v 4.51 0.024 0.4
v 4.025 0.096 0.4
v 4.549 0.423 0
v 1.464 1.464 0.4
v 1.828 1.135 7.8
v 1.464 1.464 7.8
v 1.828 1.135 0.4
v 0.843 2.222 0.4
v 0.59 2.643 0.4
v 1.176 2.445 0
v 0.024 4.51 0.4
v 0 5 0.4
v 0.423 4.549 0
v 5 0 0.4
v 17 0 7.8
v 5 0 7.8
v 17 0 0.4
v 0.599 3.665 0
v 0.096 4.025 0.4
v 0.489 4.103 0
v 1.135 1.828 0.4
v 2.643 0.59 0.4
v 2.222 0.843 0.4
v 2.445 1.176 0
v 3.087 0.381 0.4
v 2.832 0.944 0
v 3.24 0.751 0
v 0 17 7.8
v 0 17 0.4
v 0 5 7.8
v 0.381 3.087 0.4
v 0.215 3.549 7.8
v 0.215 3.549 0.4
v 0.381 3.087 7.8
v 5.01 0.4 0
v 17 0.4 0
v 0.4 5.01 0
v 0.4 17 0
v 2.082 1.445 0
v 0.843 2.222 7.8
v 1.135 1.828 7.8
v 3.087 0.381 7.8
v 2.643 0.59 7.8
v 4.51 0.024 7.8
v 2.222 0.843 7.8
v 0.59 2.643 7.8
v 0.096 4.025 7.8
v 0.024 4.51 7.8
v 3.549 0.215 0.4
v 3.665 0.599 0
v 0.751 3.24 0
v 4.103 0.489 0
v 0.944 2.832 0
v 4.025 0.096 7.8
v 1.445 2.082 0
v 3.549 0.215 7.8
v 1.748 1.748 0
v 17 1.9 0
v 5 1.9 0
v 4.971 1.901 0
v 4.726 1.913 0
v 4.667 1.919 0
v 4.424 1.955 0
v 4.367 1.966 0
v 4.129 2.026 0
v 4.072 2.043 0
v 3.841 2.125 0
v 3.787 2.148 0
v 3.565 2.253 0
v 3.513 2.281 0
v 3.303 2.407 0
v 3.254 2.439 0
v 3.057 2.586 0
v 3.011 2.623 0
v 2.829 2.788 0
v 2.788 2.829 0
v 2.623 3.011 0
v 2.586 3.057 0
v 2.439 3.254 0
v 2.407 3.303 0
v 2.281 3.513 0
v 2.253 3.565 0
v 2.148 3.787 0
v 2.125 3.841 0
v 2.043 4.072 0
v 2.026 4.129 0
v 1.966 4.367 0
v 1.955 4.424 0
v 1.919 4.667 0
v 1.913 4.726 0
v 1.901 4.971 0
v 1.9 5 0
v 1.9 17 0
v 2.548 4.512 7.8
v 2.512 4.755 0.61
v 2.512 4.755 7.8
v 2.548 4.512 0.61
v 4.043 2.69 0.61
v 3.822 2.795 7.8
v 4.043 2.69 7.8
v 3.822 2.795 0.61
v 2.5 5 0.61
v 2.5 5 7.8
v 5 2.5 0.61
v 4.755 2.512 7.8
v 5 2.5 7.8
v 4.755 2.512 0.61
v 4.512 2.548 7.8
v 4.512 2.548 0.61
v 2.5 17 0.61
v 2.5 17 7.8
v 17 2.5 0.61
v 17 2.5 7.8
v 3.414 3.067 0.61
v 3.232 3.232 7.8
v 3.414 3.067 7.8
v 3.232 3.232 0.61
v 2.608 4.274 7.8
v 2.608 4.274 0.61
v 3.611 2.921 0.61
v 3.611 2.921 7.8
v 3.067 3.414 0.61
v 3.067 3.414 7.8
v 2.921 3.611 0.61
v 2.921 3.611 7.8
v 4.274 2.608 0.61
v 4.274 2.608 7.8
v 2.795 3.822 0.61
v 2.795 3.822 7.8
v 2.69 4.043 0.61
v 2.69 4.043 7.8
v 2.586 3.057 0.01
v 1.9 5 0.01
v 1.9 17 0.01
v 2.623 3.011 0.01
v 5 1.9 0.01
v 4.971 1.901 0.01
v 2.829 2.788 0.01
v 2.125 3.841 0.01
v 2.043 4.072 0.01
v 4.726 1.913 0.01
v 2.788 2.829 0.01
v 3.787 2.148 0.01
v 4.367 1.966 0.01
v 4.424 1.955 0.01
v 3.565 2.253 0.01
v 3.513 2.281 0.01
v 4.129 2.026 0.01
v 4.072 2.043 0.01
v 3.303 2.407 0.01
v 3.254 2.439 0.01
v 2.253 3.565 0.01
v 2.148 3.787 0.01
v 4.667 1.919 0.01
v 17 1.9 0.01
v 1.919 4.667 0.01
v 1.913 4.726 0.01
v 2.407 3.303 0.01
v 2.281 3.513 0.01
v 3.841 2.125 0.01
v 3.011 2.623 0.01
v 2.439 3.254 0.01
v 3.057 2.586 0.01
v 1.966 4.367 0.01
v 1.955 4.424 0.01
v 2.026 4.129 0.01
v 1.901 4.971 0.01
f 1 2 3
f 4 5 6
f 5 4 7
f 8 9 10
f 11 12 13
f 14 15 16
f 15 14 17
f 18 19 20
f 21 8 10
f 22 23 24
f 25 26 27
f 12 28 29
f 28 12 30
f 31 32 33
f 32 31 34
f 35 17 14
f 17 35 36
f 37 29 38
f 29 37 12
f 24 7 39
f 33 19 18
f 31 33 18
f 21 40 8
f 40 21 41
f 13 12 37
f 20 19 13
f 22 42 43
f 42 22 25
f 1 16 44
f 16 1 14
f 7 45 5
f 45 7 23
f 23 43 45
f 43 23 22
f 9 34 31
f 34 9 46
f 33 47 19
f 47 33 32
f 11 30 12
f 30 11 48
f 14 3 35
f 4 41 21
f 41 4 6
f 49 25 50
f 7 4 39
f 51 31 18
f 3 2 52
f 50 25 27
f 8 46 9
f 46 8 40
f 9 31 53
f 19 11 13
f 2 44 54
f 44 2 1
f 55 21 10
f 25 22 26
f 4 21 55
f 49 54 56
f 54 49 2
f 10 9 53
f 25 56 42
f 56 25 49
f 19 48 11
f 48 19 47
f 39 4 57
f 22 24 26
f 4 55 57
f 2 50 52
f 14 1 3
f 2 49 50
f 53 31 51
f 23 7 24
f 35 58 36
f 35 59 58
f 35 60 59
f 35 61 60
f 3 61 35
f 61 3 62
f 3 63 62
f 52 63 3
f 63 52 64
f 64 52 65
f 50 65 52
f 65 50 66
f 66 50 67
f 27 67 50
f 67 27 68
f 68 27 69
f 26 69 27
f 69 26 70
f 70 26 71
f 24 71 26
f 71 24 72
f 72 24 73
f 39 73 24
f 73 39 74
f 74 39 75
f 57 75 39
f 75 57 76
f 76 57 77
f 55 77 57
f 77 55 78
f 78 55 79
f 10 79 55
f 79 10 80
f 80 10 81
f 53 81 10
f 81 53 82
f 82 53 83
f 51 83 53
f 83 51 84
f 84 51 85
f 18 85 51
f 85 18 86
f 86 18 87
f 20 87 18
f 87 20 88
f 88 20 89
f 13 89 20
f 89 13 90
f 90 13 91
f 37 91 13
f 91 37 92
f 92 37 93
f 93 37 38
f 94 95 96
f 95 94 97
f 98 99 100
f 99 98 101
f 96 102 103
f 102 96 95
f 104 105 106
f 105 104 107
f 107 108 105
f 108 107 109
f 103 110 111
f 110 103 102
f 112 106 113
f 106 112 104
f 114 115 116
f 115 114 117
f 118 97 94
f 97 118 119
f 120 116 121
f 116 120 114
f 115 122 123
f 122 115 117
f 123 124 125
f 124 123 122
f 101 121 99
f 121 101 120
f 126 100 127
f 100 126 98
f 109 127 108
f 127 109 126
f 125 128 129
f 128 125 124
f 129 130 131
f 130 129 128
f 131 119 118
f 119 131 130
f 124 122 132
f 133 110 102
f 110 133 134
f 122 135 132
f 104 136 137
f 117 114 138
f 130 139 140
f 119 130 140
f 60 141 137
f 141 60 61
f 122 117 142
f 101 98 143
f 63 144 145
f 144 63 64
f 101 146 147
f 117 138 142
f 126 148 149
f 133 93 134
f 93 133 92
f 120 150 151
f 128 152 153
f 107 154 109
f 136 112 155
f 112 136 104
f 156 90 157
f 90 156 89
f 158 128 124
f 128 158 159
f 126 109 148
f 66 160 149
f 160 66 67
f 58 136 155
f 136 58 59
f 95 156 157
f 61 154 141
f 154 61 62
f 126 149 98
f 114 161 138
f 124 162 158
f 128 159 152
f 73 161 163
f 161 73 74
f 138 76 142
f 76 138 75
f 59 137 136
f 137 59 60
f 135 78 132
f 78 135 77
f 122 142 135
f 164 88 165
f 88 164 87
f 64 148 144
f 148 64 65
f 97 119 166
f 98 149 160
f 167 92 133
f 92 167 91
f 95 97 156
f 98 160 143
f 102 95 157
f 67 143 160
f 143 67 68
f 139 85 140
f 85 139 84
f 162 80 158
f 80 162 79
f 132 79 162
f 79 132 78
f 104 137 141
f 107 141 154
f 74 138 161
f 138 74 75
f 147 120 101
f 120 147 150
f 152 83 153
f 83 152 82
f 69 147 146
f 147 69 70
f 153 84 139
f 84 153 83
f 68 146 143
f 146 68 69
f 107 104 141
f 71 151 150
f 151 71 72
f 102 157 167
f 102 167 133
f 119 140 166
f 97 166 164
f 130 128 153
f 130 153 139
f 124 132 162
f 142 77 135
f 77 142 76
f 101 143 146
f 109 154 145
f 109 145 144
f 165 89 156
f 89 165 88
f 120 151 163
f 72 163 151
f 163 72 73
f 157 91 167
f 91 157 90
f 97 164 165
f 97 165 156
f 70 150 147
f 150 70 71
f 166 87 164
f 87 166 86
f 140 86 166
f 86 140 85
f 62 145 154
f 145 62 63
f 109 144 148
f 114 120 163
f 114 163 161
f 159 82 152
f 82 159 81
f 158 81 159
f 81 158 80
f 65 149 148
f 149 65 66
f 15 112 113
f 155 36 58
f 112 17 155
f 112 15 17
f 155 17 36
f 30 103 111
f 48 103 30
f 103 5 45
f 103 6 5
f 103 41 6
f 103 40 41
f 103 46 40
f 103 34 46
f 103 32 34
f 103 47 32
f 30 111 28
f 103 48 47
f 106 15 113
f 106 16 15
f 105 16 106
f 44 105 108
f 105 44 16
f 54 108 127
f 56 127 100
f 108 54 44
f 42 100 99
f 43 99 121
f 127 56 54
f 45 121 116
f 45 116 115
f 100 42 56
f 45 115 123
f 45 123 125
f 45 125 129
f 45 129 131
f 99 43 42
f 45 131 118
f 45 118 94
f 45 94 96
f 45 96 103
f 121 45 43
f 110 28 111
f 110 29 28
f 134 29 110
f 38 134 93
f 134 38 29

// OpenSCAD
// Rounded L bracket — construction walkthrough.
//
// Standalone teaching file for the rounded L bracket example.
// It exposes the deliberately extended convex profiles, both chamfer
// constructions, and the final trimming operation.

$fn = 64;

design_step = "10_chamfer_closeup"; // [01_outer_profile,02_inner_profile,03_shell_profile,04_outer_chamfer_inputs,05_outer_body,06_inner_chamfer_inputs,07_inner_chamfer_cut,08_before_trim,09_final_trim,10_chamfer_closeup]

leg_x          = 40;
leg_y          = 30;
height         = 20;
wall_thickness = 2.5;
outer_radius   = 5;
inner_chamfer  = 0.6;
outer_chamfer  = 0.4;

epsilon      = 0.01;
inner_radius = max(outer_radius - wall_thickness, 0.01);

profile_x = leg_x + 2;
profile_y = leg_y + 2;

// ---------- Shared geometry ----------

module outer_2d() {
    hull() {
        translate([outer_radius, outer_radius])
            circle(outer_radius);

        translate([profile_x - epsilon, 0])
            square([epsilon, profile_y]);

        translate([0, profile_y - epsilon])
            square([profile_x, epsilon]);
    }
}

module inner_2d() {
    translate([wall_thickness, wall_thickness])
        hull() {
            translate([inner_radius, inner_radius])
                circle(inner_radius);

            translate([profile_x - epsilon, 0])
                square([epsilon, profile_y]);

            translate([0, profile_y - epsilon])
                square([profile_x, epsilon]);
        }
}

module shell_2d() {
    difference() {
        outer_2d();
        inner_2d();
    }
}

module outer_end_layer(z, inset = 0, thickness = 0.08) {
    translate([0, 0, z])
        linear_extrude(thickness)
            offset(r = inset)
                outer_2d();
}

module inner_end_layer(z, expansion = 0, thickness = 0.08) {
    translate([0, 0, z])
        linear_extrude(thickness)
            offset(r = expansion)
                inner_2d();
}

module outer_body() {
    hull() {
        linear_extrude(epsilon)
            offset(r = -outer_chamfer)
                outer_2d();

        translate([0, 0, outer_chamfer])
            linear_extrude(height - 2 * outer_chamfer)
                outer_2d();

        translate([0, 0, height - epsilon])
            linear_extrude(epsilon)
                offset(r = -outer_chamfer)
                    outer_2d();
    }
}

module continuous_inner_cutout(extra = 1) {
    translate([0, 0, -extra])
        linear_extrude(height + 2 * extra)
            inner_2d();
}

module inner_chamfer_cut() {
    hull() {
        translate([0, 0, -epsilon])
            linear_extrude(2 * epsilon)
                offset(r = inner_chamfer)
                    inner_2d();

        translate([0, 0, inner_chamfer])
            linear_extrude(epsilon)
                inner_2d();
    }
}

module before_trim() {
    difference() {
        outer_body();
        continuous_inner_cutout();
        inner_chamfer_cut();

        translate([0, 0, height])
            mirror([0, 0, 1])
                inner_chamfer_cut();
    }
}

module trim_box(extra = 1) {
    translate([0, 0, -extra])
        cube([leg_x, leg_y, height + 2 * extra]);
}

module final_bracket() {
    intersection() {
        before_trim();
        trim_box();
    }
}

// ---------- Walkthrough stages ----------

module stage_01_outer_profile() {
    color([0.20, 0.55, 0.85])
        linear_extrude(0.6)
            outer_2d();

    // Mark the final X/Y leg limits. The profile extends beyond both.
    %translate([0, 0, -0.1])
        cube([leg_x, leg_y, 0.8]);
}

module stage_02_inner_profile() {
    color([0.95, 0.50, 0.15])
        linear_extrude(0.6)
            inner_2d();

    %translate([0, 0, -0.1])
        cube([leg_x, leg_y, 0.8]);
}

module stage_03_shell_profile() {
    color([0.25, 0.65, 0.45])
        linear_extrude(0.8)
            shell_2d();

    %translate([0, 0, -0.1])
        cube([leg_x, leg_y, 1.0]);
}

module stage_04_outer_chamfer_inputs() {
    color([0.95, 0.45, 0.15])
        outer_end_layer(0, -outer_chamfer);

    color([0.20, 0.55, 0.85])
        outer_end_layer(outer_chamfer, 0);

    %translate([0, 0, outer_chamfer])
        linear_extrude(5)
            outer_2d();
}

module stage_05_outer_body() {
    intersection() {
        outer_body();

        translate([-2, -2, -0.2])
            cube([profile_x + 4, profile_y + 4, 8]);
    }
}

module stage_06_inner_chamfer_inputs() {
    color([0.95, 0.45, 0.15])
        inner_end_layer(0, inner_chamfer);

    color([0.20, 0.55, 0.85])
        inner_end_layer(inner_chamfer, 0);

    %difference() {
        intersection() {
            outer_body();
            translate([-2, -2, -0.2])
                cube([profile_x + 4, profile_y + 4, 7]);
        }
        continuous_inner_cutout();
    }
}

module stage_07_inner_chamfer_cut() {
    color([0.95, 0.35, 0.12])
        inner_chamfer_cut();

    %difference() {
        intersection() {
            outer_body();
            translate([-2, -2, -0.2])
                cube([profile_x + 4, profile_y + 4, 7]);
        }
        continuous_inner_cutout();
    }
}

module stage_08_before_trim() {
    before_trim();

    // Ghost the final trim box to show the deliberate overhang.
    %trim_box();
}

module stage_09_final_trim() {
    final_bracket();
}

module stage_10_chamfer_closeup() {
    // Keep the rounded corner and only the lower 8 mm.
    intersection() {
        final_bracket();

        translate([-1, -1, -0.2])
            cube([
                min(18, leg_x + 1),
                min(18, leg_y + 1),
                8
            ]);
    }
}

// ---------- Selector ----------

if (design_step == "01_outer_profile")
    stage_01_outer_profile();
else if (design_step == "02_inner_profile")
    stage_02_inner_profile();
else if (design_step == "03_shell_profile")
    stage_03_shell_profile();
else if (design_step == "04_outer_chamfer_inputs")
    stage_04_outer_chamfer_inputs();
else if (design_step == "05_outer_body")
    stage_05_outer_body();
else if (design_step == "06_inner_chamfer_inputs")
    stage_06_inner_chamfer_inputs();
else if (design_step == "07_inner_chamfer_cut")
    stage_07_inner_chamfer_cut();
else if (design_step == "08_before_trim")
    stage_08_before_trim();
else if (design_step == "09_final_trim")
    stage_09_final_trim();
else
    stage_10_chamfer_closeup();
